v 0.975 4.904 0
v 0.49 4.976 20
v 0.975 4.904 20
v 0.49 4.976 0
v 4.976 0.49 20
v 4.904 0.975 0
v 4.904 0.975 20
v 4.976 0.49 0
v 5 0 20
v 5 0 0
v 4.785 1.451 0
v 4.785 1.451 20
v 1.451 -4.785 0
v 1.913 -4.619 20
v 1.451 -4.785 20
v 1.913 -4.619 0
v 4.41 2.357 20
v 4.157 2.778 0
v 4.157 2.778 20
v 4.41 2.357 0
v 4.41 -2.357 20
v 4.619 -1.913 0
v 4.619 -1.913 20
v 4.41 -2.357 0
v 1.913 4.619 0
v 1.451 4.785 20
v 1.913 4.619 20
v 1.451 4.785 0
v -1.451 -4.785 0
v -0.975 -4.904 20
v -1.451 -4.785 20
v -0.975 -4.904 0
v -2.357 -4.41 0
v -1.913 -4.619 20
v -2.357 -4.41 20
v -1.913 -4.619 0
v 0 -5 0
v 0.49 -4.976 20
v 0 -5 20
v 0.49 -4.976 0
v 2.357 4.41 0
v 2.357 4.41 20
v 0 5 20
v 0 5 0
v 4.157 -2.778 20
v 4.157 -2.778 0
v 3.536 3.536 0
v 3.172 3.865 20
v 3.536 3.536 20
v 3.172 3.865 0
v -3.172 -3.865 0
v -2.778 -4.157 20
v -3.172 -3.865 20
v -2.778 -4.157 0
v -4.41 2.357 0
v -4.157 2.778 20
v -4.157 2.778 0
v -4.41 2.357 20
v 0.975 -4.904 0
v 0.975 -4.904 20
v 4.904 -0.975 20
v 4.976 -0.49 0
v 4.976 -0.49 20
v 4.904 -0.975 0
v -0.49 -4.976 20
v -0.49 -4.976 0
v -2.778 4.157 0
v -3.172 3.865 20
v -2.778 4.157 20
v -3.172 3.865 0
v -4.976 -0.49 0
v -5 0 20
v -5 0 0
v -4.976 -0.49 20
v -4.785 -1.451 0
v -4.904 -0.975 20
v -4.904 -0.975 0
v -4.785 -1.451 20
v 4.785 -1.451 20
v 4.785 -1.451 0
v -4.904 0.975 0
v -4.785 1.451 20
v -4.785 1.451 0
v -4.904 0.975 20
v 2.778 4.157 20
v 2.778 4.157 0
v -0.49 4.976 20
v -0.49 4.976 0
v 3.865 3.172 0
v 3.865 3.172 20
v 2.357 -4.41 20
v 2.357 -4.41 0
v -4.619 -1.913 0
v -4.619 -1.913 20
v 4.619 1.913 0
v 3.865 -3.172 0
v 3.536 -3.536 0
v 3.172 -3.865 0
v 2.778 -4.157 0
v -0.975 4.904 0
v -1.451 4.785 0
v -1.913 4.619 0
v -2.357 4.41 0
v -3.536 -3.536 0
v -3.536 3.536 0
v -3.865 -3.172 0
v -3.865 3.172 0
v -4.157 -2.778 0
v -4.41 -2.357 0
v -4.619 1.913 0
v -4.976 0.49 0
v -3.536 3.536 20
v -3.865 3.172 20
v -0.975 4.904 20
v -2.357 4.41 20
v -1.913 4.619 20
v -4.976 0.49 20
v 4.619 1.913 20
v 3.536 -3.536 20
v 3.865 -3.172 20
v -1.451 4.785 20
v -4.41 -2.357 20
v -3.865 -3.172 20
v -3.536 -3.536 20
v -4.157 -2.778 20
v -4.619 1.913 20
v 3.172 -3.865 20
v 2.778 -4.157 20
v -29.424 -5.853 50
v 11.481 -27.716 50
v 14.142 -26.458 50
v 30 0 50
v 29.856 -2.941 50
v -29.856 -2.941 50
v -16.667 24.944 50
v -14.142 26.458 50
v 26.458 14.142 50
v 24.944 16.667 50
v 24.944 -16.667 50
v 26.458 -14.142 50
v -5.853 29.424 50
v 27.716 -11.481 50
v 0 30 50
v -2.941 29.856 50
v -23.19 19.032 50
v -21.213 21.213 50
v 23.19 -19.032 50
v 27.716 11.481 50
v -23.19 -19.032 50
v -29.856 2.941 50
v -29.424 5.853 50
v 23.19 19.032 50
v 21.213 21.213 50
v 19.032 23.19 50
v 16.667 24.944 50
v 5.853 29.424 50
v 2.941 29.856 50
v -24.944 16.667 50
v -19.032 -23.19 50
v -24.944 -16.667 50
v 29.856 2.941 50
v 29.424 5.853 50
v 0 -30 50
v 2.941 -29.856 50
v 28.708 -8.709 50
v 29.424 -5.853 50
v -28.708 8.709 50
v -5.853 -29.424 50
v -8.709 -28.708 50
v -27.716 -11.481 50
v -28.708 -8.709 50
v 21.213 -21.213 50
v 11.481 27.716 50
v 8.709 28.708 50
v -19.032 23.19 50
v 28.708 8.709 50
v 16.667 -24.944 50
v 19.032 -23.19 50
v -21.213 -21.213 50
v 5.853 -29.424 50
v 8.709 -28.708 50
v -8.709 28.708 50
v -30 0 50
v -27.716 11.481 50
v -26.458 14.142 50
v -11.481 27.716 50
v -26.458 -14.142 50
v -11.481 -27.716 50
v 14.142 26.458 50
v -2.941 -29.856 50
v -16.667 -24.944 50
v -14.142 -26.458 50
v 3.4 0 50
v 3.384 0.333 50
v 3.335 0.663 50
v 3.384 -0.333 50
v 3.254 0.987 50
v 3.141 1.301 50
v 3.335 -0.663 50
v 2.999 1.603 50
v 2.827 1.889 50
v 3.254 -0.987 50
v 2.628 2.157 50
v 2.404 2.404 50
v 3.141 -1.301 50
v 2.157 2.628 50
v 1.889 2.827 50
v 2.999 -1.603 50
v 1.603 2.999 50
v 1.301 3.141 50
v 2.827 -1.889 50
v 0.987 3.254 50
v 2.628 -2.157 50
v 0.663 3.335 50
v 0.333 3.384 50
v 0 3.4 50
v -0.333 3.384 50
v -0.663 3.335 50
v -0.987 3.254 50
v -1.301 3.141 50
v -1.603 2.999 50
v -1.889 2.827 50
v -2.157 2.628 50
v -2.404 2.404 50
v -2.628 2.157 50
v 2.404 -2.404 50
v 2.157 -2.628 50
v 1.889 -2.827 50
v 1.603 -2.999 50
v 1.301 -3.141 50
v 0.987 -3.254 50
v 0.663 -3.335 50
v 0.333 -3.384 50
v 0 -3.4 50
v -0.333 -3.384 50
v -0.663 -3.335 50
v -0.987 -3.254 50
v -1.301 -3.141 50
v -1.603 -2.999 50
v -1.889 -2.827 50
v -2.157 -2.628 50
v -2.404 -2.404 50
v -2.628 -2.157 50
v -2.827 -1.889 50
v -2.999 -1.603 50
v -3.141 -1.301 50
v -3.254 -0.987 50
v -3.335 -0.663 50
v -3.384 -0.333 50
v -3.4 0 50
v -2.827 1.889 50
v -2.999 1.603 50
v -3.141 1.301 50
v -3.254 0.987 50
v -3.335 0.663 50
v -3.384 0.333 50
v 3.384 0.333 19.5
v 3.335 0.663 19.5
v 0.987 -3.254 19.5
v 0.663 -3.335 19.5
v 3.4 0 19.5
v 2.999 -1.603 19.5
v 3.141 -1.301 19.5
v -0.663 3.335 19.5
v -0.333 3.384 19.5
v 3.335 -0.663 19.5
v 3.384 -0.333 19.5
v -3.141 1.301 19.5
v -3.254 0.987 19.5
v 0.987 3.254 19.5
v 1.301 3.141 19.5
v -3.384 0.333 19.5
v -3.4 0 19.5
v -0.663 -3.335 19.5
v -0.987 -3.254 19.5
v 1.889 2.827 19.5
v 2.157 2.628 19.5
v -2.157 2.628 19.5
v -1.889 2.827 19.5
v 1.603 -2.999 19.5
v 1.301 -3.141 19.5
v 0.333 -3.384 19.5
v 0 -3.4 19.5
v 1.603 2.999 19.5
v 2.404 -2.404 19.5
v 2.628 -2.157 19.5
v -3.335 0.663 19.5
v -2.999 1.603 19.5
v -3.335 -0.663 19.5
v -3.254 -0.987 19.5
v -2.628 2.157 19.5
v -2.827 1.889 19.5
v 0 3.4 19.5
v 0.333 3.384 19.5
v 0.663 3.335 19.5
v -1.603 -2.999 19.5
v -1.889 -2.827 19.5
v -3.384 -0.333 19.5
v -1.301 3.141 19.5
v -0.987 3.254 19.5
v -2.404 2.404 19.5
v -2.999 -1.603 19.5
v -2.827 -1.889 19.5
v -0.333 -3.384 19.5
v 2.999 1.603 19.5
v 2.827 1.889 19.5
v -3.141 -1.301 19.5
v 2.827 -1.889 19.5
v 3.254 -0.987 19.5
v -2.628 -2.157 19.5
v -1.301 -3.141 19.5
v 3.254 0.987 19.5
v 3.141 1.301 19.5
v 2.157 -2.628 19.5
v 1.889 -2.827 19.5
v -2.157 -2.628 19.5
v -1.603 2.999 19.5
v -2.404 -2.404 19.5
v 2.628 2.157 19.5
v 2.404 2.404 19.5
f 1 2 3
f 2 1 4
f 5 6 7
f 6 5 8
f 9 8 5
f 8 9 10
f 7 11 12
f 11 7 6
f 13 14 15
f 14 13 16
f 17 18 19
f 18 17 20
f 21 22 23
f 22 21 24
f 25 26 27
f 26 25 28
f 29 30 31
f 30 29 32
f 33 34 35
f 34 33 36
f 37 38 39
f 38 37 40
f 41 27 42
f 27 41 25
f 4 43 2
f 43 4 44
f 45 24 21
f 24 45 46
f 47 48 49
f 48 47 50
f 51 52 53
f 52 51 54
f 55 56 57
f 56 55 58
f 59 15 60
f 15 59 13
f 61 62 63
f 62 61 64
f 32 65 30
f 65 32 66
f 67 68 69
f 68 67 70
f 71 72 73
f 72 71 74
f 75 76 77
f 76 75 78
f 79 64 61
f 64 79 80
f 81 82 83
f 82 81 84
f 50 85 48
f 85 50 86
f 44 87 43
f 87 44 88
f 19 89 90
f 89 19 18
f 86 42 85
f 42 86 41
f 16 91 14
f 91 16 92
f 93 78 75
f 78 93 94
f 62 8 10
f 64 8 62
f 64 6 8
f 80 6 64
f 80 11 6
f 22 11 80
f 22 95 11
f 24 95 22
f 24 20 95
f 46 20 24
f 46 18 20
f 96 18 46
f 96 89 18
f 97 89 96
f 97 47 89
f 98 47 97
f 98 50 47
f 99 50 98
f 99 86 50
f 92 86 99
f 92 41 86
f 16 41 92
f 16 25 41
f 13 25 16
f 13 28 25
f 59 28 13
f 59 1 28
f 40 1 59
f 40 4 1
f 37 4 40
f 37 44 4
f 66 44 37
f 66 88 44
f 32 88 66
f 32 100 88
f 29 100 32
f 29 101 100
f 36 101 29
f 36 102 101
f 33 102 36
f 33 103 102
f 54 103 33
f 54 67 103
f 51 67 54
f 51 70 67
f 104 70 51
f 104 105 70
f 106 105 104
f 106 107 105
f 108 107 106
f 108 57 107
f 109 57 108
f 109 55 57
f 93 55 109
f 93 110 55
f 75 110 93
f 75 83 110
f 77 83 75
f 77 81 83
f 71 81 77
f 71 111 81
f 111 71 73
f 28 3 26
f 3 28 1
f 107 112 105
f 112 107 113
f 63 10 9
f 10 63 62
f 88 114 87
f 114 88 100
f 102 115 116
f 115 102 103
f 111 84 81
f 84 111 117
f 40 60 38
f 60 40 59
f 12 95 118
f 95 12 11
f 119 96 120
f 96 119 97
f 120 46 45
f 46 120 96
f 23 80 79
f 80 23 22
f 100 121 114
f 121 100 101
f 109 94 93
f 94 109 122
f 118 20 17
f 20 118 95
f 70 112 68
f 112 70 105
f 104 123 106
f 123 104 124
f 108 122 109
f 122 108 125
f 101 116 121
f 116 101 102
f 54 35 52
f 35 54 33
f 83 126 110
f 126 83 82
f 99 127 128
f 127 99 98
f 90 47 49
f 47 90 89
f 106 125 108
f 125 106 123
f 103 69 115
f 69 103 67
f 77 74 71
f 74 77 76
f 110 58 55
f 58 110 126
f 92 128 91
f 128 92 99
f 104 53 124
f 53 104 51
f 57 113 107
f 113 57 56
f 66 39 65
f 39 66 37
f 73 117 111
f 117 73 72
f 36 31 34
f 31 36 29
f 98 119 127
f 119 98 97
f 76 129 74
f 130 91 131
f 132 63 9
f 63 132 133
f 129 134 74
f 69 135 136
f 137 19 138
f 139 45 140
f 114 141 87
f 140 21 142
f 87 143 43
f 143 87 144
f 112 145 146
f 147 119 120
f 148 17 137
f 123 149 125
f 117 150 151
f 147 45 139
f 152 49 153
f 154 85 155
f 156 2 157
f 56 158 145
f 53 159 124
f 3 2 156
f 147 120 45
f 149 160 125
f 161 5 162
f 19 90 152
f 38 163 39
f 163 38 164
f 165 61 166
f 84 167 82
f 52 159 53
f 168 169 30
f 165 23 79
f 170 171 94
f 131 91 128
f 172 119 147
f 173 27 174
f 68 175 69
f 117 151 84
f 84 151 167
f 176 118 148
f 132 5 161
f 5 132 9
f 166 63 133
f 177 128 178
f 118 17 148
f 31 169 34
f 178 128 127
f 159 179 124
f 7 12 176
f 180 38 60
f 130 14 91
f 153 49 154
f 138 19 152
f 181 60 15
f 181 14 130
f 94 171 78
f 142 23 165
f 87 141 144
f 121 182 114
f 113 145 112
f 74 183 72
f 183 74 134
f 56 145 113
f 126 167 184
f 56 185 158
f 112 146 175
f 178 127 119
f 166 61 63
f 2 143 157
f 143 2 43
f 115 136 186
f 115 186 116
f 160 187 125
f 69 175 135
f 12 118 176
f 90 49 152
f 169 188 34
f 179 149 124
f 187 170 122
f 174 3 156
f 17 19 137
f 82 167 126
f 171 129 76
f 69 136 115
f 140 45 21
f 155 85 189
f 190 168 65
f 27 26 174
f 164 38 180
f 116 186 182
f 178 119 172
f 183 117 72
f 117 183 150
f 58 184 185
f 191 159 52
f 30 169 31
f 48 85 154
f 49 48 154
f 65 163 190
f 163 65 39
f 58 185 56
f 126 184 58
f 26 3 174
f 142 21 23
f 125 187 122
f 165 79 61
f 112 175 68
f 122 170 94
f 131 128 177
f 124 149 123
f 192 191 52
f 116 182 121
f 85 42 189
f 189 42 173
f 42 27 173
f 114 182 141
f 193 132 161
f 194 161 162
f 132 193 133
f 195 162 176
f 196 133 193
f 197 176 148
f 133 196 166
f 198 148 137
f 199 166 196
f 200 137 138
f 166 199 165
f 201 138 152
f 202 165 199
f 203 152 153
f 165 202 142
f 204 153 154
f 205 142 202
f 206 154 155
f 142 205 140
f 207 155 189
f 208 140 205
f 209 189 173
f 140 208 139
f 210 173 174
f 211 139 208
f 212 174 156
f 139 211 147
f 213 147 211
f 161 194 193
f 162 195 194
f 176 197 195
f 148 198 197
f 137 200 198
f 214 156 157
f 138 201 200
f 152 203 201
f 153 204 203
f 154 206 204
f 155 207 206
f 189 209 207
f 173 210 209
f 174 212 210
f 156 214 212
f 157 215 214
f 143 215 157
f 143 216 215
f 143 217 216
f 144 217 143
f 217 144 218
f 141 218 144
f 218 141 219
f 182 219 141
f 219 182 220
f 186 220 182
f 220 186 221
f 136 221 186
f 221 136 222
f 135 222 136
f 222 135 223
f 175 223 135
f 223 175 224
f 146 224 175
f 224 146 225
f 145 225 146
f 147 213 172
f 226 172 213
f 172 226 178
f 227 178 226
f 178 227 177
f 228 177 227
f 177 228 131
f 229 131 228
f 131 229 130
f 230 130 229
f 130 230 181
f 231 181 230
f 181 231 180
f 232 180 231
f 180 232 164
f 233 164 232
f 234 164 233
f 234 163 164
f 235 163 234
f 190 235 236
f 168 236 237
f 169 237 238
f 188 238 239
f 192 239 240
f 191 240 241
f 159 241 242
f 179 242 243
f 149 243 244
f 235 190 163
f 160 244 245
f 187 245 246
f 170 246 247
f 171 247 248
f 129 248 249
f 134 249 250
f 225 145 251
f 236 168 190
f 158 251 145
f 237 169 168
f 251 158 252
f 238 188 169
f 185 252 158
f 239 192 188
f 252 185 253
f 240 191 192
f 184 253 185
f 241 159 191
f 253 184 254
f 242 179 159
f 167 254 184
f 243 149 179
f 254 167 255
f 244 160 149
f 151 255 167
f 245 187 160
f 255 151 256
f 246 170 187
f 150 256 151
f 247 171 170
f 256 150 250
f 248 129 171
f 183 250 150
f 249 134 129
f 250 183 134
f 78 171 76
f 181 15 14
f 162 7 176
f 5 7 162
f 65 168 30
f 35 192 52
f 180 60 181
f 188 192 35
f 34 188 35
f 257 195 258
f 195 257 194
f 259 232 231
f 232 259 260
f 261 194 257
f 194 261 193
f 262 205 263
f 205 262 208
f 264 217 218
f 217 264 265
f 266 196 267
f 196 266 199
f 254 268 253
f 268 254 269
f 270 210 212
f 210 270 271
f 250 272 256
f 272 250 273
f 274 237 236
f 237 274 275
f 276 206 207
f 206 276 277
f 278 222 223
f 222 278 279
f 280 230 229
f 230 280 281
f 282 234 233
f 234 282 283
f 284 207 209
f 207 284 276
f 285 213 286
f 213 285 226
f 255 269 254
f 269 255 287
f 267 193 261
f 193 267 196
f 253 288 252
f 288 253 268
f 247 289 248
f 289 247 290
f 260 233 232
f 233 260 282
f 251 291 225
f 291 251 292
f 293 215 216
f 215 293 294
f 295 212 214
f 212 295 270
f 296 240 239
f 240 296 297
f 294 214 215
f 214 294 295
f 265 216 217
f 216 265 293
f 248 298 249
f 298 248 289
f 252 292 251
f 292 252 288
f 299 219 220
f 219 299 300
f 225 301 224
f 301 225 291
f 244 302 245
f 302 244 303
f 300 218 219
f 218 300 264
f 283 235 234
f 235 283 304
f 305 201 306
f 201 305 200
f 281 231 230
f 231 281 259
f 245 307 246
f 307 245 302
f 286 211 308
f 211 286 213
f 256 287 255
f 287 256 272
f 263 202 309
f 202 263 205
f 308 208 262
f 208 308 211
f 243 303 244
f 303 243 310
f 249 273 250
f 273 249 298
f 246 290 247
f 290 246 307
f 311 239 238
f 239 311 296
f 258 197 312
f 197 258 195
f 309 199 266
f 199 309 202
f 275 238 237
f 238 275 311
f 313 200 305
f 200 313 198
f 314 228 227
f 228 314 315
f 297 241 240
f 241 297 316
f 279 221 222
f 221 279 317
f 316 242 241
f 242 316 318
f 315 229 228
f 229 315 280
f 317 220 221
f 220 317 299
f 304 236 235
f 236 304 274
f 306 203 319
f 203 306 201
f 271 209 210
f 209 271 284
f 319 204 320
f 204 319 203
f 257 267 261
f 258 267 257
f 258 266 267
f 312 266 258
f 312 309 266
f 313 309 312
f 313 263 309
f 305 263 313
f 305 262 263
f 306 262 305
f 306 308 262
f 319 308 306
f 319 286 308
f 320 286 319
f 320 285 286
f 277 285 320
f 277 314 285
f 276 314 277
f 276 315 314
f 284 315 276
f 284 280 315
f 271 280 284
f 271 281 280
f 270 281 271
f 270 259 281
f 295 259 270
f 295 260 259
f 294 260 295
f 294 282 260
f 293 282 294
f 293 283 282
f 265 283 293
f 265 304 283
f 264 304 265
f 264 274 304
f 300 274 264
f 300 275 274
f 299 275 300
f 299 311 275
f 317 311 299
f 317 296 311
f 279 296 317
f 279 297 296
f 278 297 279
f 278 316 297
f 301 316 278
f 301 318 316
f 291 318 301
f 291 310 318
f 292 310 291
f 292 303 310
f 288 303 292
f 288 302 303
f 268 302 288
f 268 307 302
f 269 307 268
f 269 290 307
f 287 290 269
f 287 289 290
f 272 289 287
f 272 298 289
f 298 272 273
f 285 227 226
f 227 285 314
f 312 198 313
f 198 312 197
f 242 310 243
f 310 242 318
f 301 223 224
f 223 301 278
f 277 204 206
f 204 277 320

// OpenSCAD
// Lab funnel - printed upright, open at top and bottom
// Units: mm

$fn = 64;

// --- Dimensions ---
spout_od      = 10;    // spout outer diameter (z = 0 to 20)
spout_length  = 20;    // spout length
cone_top_od   = 10;    // cone outer diameter at spout junction (z = 20)
cone_rim_od   = 60;    // cone rim outer diameter (z = 50)
cone_height   = 30;    // cone height (z = 20 to 50)
wall          = 1.6;   // wall thickness everywhere

// --- Derived ---
spout_id = spout_od - 2 * wall;   // bore of spout
eps      = 0.5;                  // cutter overshoot

// --- Model ---
difference() {
    union() {
        // Spout (tube)
        cylinder(d = spout_od, h = spout_length);
        // Cone
        translate([0, 0, spout_length])
            cylinder(d1 = cone_top_od, d2 = cone_rim_od, h = cone_height);
    }
    // Through-bore: spout bore up to cone, then cone wall thins to rim (open top)
    translate([0, 0, spout_length - eps])
        linear_extrude(height = cone_height + eps)
            circle(d = spout_id);
}
